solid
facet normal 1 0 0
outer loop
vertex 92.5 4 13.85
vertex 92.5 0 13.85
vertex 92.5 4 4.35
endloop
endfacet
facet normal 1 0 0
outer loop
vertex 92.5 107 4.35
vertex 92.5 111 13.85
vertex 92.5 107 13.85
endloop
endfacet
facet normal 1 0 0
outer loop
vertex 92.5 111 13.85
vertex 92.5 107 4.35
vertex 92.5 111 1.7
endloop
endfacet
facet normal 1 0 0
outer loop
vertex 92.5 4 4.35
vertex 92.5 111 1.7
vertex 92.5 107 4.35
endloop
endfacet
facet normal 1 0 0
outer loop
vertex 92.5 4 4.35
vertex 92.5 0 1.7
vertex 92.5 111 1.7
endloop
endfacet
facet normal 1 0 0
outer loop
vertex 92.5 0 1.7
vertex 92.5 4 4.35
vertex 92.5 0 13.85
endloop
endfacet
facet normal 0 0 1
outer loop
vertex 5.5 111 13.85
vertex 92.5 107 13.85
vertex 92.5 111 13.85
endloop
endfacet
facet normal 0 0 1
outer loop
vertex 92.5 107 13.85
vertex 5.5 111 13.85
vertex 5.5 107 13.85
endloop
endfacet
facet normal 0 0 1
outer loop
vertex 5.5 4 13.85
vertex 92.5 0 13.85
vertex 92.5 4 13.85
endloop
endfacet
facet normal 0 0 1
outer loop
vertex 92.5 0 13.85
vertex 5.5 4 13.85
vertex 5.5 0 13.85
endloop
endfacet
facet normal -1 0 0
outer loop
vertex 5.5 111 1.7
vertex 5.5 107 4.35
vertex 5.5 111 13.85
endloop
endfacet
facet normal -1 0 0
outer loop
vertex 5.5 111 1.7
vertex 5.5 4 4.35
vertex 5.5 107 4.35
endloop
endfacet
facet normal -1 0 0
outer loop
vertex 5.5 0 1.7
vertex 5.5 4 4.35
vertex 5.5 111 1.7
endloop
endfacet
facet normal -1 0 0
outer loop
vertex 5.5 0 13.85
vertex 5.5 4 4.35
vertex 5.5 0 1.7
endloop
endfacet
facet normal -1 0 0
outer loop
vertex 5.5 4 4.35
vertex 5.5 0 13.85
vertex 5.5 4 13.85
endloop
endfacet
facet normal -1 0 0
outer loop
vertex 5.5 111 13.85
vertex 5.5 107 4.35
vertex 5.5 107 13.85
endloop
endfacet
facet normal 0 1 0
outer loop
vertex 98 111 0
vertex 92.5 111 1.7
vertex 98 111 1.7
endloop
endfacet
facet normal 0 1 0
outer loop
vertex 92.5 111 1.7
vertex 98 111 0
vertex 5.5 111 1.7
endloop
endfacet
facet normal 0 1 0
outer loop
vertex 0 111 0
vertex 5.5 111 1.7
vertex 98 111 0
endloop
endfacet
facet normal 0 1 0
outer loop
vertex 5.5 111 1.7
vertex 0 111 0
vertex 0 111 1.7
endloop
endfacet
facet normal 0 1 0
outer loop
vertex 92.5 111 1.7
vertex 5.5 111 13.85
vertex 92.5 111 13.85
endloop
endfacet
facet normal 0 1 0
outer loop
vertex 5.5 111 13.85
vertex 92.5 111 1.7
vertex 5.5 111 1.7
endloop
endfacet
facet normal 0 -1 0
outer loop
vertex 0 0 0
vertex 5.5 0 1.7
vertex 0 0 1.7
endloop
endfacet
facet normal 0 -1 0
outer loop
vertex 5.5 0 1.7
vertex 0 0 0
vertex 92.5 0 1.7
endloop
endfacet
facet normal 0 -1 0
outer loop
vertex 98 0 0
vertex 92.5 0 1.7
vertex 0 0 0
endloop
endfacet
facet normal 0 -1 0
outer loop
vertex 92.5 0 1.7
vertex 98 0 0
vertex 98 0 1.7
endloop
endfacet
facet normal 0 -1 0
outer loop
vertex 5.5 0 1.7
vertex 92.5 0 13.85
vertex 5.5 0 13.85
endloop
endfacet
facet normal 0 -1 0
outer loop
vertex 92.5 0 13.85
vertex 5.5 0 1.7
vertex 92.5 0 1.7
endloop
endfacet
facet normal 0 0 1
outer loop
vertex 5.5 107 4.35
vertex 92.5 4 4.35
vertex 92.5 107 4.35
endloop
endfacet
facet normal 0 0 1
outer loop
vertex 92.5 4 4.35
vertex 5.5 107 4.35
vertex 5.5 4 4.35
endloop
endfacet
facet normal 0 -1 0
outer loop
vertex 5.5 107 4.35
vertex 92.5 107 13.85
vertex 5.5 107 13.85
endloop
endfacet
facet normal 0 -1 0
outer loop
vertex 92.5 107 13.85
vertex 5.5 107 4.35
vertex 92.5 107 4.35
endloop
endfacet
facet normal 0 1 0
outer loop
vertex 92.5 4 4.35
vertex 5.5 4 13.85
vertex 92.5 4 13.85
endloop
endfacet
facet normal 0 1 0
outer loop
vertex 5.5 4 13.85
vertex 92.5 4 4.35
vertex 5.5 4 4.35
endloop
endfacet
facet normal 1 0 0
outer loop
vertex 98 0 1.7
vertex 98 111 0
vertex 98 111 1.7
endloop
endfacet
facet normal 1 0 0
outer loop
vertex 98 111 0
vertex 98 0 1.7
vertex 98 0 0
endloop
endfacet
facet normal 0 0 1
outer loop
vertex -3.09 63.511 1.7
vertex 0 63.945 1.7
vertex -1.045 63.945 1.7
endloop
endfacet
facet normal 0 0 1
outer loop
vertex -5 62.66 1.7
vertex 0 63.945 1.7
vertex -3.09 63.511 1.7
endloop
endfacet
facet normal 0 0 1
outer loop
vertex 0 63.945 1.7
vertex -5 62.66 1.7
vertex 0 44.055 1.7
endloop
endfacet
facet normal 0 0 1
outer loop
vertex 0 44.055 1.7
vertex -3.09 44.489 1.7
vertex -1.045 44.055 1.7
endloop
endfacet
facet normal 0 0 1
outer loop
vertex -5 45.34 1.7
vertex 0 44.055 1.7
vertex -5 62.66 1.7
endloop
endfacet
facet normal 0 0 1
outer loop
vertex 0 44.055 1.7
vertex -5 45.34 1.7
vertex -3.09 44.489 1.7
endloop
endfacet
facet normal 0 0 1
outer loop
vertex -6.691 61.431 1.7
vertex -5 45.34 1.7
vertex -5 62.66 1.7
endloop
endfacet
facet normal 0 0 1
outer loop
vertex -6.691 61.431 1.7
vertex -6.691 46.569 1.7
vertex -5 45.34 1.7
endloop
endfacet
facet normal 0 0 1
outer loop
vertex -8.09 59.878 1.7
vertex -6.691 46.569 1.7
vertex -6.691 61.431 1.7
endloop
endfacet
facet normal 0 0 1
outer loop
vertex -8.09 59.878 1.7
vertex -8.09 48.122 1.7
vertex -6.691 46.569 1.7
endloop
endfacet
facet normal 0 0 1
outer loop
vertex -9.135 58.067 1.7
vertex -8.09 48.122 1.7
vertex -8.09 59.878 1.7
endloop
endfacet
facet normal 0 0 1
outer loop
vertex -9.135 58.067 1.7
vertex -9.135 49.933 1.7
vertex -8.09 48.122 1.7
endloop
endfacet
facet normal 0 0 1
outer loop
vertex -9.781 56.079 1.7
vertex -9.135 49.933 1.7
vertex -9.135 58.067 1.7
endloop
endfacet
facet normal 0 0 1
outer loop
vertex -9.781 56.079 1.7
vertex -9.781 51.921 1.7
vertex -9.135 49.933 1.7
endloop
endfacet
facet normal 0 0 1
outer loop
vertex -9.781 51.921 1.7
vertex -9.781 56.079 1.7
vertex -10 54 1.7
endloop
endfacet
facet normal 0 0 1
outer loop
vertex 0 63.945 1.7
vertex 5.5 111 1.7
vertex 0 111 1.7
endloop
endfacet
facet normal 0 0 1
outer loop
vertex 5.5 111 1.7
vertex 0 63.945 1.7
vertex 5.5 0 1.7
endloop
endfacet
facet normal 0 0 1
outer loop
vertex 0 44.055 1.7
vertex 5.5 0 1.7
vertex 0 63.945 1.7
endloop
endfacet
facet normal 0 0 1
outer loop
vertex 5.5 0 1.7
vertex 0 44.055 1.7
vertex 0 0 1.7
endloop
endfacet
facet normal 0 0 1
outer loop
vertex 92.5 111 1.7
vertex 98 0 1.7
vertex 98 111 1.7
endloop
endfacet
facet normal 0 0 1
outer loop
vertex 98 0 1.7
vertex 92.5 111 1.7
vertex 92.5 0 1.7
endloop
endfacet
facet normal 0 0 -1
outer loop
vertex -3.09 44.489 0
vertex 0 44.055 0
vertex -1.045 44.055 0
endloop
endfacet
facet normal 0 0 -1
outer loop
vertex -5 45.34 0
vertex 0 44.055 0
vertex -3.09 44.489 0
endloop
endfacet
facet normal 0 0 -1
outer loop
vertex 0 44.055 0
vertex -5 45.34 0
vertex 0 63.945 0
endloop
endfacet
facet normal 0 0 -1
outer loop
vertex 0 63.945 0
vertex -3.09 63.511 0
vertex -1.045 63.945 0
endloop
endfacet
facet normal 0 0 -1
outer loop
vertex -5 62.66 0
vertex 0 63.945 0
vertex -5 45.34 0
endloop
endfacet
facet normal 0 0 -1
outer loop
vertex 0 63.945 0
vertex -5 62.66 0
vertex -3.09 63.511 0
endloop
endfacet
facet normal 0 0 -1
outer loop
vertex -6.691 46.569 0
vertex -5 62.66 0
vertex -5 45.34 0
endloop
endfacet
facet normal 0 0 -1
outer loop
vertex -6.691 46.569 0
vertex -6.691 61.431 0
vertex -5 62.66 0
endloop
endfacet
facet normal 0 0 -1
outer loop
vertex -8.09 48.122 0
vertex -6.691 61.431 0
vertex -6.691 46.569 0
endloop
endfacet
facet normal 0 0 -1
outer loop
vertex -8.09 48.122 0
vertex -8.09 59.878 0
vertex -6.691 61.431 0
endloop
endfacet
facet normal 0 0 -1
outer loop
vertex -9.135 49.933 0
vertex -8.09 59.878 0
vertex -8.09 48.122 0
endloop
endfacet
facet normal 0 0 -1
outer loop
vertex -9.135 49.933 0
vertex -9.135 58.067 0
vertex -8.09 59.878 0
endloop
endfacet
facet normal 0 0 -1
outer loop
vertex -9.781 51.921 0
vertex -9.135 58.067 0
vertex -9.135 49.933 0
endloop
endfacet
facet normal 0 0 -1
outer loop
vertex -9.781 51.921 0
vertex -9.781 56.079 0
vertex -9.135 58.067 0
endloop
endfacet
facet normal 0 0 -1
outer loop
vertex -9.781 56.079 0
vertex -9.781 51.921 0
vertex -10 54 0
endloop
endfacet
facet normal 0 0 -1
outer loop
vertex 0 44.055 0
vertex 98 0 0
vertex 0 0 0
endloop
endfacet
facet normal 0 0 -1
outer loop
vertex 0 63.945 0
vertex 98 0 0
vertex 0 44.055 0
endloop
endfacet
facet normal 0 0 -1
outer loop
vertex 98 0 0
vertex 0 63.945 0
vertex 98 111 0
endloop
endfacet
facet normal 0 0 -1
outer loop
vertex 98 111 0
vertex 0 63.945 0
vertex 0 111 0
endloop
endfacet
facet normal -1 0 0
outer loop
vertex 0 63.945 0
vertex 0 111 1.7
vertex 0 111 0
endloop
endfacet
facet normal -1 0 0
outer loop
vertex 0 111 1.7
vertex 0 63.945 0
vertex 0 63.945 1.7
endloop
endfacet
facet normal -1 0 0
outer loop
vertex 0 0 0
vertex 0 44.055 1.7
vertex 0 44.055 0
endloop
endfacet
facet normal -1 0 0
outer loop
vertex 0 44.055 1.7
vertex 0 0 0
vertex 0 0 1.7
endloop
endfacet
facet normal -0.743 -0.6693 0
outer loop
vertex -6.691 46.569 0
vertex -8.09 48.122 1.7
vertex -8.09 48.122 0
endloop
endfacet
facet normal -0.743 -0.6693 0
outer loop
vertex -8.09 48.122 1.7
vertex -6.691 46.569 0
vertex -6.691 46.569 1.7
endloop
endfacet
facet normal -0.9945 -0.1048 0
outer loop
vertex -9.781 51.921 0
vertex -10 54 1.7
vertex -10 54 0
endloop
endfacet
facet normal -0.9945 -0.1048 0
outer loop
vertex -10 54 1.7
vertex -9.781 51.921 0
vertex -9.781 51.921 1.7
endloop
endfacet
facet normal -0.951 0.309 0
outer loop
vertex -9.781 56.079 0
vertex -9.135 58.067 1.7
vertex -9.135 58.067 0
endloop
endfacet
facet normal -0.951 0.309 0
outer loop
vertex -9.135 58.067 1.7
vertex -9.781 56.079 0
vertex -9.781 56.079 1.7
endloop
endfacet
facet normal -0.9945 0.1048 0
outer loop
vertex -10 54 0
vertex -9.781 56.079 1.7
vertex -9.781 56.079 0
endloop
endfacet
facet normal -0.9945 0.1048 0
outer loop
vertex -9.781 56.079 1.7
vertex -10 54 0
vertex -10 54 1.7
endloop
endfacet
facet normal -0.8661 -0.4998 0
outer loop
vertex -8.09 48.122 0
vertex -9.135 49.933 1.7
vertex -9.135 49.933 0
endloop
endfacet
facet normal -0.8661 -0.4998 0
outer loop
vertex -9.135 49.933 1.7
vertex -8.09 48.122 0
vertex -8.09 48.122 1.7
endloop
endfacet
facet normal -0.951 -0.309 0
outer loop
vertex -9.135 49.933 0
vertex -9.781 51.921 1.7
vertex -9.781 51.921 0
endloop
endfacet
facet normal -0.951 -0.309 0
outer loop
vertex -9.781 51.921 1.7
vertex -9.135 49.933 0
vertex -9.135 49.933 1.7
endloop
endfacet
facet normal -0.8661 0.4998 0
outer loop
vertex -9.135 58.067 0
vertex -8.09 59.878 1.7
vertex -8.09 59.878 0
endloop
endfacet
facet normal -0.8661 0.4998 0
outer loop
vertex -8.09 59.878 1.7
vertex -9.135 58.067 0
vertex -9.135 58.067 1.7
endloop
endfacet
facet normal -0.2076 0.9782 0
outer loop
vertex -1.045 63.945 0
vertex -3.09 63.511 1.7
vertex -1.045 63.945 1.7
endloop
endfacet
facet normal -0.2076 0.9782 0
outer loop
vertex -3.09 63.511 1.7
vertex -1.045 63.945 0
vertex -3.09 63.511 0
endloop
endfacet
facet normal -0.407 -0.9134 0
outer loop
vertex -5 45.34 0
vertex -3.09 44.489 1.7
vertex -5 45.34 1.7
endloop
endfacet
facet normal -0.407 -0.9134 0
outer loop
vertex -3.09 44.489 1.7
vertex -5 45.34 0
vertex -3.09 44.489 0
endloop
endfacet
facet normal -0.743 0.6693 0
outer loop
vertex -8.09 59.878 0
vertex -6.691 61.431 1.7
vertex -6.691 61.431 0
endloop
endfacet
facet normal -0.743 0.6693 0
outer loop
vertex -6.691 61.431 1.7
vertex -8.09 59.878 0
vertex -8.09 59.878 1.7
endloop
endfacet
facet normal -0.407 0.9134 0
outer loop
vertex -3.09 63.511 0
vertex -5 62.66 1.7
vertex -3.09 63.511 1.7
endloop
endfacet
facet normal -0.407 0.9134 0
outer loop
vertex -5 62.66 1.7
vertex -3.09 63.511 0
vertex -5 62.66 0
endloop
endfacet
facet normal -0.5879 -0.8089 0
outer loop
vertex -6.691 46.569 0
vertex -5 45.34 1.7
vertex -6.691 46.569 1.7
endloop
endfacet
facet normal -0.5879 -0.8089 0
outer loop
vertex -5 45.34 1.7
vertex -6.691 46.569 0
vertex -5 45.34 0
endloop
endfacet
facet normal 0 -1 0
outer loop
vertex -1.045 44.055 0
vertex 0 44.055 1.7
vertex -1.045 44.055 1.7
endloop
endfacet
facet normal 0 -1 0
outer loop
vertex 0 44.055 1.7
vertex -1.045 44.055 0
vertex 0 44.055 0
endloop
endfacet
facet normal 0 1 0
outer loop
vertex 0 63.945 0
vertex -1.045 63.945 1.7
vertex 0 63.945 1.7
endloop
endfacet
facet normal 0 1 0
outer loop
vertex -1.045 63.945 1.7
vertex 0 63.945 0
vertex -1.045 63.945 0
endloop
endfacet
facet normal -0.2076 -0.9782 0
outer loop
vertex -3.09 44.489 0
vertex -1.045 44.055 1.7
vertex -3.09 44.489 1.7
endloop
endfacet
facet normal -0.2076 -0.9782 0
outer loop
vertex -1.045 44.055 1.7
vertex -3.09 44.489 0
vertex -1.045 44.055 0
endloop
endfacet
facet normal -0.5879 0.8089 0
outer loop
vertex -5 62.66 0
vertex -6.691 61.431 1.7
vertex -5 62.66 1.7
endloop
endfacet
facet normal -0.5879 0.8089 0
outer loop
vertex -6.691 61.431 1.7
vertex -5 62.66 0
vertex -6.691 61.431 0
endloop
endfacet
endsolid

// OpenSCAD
WIDTH = 98.0;
LENGTH = 111;
HEIGHT = 3.5;
HOLDER_HEIGHT = 1.7;
BORDER_HEIGHT = 13;
HOLDER_WIDTH = 5.5;
BORDER_WIDTH=0;
BORDER_WIDTH_FRONTBACK = 4;

union() {
    cube([WIDTH, LENGTH, HOLDER_HEIGHT]);
    translate([HOLDER_WIDTH, 0, HOLDER_HEIGHT/2])
        difference() {
            cube([WIDTH - (2*HOLDER_WIDTH), LENGTH, BORDER_HEIGHT]);
            translate([BORDER_WIDTH, BORDER_WIDTH_FRONTBACK, HEIGHT]) 
                cube([WIDTH - (2*(HOLDER_WIDTH+BORDER_WIDTH)), LENGTH-(2*BORDER_WIDTH_FRONTBACK), BORDER_HEIGHT-HEIGHT]);
        }
    translate([0, WIDTH/2+5, 0]) linear_extrude(height=HOLDER_HEIGHT) circle(r=10);
}
